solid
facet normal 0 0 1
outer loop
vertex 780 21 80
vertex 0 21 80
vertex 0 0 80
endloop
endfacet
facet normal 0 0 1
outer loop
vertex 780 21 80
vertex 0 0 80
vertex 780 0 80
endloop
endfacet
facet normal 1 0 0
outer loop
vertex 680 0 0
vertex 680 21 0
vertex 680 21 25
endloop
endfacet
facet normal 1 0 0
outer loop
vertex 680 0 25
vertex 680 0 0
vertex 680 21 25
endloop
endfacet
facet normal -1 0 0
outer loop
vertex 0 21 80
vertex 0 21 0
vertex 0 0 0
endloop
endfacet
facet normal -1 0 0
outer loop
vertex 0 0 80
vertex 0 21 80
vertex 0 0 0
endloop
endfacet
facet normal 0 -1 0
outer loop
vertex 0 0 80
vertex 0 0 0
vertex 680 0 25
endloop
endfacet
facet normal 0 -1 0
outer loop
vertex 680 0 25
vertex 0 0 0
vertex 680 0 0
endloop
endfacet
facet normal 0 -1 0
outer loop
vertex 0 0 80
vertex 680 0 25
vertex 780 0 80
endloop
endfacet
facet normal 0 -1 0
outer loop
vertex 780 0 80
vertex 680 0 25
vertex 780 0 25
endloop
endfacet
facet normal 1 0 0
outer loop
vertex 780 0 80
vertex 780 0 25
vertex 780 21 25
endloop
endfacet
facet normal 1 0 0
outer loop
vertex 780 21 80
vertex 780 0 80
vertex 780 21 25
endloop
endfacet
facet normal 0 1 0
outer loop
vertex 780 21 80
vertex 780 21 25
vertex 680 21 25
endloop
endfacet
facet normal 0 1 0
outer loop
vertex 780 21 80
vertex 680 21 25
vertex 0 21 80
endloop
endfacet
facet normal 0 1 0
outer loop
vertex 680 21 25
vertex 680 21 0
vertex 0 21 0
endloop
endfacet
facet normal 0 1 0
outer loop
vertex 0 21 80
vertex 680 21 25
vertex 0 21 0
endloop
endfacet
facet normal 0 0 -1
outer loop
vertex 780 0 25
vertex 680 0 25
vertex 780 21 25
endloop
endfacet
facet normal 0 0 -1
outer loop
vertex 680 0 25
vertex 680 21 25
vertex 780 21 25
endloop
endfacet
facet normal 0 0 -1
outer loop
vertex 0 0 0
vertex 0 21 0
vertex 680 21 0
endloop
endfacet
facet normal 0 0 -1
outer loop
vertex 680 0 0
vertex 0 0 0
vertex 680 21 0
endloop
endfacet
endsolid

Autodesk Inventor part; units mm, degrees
ref_plane "YZ Plane" through (0, 0, 0) normal (1, 0, 0) x (0, 1, 0)
ref_plane "XZ Plane" through (0, 0, 0) normal (0, 1, 0) x (-1, 0, 0)
ref_plane "XY Plane" through (0, 0, 0) normal (0, 0, 1) x (1, 0, 0)
sketch "Sketch1" plane through (0, 0, 0) normal (0, 0, 1) x (1, 0, 0)
  line L0 (0, 0) -> (780, 0)
  line L1 (780, 0) -> (780, 21)
  line L2 (780, 21) -> (0, 21)
  line L3 (0, 21) -> (0, 0)
  dimension "d0" = 780
  dimension "d1" = 21
extrude "Extrusion1" add sketch "Sketch1" along normal blind 80
sketch "Sketch2" plane through (0, 21, 0) normal (0, 1, 0) x (1, 0, 0)
  line L0 (780, 0) -> (780, -80) projected
  line L1 (780, 0) -> (680, 0)
  line L2 (680, 0) -> (680, -25)
  line L3 (680, -25) -> (780, -25)
  line L4 (780, -25) -> (780, 0)
  point P0 (0, 0)
  dimension "d4" = 100
  dimension "d5" = 25
extrude "Extrusion2" cut sketch "Sketch2" against normal through all
properties part number "MPX-rib2" material "Wood (Cherry)"
